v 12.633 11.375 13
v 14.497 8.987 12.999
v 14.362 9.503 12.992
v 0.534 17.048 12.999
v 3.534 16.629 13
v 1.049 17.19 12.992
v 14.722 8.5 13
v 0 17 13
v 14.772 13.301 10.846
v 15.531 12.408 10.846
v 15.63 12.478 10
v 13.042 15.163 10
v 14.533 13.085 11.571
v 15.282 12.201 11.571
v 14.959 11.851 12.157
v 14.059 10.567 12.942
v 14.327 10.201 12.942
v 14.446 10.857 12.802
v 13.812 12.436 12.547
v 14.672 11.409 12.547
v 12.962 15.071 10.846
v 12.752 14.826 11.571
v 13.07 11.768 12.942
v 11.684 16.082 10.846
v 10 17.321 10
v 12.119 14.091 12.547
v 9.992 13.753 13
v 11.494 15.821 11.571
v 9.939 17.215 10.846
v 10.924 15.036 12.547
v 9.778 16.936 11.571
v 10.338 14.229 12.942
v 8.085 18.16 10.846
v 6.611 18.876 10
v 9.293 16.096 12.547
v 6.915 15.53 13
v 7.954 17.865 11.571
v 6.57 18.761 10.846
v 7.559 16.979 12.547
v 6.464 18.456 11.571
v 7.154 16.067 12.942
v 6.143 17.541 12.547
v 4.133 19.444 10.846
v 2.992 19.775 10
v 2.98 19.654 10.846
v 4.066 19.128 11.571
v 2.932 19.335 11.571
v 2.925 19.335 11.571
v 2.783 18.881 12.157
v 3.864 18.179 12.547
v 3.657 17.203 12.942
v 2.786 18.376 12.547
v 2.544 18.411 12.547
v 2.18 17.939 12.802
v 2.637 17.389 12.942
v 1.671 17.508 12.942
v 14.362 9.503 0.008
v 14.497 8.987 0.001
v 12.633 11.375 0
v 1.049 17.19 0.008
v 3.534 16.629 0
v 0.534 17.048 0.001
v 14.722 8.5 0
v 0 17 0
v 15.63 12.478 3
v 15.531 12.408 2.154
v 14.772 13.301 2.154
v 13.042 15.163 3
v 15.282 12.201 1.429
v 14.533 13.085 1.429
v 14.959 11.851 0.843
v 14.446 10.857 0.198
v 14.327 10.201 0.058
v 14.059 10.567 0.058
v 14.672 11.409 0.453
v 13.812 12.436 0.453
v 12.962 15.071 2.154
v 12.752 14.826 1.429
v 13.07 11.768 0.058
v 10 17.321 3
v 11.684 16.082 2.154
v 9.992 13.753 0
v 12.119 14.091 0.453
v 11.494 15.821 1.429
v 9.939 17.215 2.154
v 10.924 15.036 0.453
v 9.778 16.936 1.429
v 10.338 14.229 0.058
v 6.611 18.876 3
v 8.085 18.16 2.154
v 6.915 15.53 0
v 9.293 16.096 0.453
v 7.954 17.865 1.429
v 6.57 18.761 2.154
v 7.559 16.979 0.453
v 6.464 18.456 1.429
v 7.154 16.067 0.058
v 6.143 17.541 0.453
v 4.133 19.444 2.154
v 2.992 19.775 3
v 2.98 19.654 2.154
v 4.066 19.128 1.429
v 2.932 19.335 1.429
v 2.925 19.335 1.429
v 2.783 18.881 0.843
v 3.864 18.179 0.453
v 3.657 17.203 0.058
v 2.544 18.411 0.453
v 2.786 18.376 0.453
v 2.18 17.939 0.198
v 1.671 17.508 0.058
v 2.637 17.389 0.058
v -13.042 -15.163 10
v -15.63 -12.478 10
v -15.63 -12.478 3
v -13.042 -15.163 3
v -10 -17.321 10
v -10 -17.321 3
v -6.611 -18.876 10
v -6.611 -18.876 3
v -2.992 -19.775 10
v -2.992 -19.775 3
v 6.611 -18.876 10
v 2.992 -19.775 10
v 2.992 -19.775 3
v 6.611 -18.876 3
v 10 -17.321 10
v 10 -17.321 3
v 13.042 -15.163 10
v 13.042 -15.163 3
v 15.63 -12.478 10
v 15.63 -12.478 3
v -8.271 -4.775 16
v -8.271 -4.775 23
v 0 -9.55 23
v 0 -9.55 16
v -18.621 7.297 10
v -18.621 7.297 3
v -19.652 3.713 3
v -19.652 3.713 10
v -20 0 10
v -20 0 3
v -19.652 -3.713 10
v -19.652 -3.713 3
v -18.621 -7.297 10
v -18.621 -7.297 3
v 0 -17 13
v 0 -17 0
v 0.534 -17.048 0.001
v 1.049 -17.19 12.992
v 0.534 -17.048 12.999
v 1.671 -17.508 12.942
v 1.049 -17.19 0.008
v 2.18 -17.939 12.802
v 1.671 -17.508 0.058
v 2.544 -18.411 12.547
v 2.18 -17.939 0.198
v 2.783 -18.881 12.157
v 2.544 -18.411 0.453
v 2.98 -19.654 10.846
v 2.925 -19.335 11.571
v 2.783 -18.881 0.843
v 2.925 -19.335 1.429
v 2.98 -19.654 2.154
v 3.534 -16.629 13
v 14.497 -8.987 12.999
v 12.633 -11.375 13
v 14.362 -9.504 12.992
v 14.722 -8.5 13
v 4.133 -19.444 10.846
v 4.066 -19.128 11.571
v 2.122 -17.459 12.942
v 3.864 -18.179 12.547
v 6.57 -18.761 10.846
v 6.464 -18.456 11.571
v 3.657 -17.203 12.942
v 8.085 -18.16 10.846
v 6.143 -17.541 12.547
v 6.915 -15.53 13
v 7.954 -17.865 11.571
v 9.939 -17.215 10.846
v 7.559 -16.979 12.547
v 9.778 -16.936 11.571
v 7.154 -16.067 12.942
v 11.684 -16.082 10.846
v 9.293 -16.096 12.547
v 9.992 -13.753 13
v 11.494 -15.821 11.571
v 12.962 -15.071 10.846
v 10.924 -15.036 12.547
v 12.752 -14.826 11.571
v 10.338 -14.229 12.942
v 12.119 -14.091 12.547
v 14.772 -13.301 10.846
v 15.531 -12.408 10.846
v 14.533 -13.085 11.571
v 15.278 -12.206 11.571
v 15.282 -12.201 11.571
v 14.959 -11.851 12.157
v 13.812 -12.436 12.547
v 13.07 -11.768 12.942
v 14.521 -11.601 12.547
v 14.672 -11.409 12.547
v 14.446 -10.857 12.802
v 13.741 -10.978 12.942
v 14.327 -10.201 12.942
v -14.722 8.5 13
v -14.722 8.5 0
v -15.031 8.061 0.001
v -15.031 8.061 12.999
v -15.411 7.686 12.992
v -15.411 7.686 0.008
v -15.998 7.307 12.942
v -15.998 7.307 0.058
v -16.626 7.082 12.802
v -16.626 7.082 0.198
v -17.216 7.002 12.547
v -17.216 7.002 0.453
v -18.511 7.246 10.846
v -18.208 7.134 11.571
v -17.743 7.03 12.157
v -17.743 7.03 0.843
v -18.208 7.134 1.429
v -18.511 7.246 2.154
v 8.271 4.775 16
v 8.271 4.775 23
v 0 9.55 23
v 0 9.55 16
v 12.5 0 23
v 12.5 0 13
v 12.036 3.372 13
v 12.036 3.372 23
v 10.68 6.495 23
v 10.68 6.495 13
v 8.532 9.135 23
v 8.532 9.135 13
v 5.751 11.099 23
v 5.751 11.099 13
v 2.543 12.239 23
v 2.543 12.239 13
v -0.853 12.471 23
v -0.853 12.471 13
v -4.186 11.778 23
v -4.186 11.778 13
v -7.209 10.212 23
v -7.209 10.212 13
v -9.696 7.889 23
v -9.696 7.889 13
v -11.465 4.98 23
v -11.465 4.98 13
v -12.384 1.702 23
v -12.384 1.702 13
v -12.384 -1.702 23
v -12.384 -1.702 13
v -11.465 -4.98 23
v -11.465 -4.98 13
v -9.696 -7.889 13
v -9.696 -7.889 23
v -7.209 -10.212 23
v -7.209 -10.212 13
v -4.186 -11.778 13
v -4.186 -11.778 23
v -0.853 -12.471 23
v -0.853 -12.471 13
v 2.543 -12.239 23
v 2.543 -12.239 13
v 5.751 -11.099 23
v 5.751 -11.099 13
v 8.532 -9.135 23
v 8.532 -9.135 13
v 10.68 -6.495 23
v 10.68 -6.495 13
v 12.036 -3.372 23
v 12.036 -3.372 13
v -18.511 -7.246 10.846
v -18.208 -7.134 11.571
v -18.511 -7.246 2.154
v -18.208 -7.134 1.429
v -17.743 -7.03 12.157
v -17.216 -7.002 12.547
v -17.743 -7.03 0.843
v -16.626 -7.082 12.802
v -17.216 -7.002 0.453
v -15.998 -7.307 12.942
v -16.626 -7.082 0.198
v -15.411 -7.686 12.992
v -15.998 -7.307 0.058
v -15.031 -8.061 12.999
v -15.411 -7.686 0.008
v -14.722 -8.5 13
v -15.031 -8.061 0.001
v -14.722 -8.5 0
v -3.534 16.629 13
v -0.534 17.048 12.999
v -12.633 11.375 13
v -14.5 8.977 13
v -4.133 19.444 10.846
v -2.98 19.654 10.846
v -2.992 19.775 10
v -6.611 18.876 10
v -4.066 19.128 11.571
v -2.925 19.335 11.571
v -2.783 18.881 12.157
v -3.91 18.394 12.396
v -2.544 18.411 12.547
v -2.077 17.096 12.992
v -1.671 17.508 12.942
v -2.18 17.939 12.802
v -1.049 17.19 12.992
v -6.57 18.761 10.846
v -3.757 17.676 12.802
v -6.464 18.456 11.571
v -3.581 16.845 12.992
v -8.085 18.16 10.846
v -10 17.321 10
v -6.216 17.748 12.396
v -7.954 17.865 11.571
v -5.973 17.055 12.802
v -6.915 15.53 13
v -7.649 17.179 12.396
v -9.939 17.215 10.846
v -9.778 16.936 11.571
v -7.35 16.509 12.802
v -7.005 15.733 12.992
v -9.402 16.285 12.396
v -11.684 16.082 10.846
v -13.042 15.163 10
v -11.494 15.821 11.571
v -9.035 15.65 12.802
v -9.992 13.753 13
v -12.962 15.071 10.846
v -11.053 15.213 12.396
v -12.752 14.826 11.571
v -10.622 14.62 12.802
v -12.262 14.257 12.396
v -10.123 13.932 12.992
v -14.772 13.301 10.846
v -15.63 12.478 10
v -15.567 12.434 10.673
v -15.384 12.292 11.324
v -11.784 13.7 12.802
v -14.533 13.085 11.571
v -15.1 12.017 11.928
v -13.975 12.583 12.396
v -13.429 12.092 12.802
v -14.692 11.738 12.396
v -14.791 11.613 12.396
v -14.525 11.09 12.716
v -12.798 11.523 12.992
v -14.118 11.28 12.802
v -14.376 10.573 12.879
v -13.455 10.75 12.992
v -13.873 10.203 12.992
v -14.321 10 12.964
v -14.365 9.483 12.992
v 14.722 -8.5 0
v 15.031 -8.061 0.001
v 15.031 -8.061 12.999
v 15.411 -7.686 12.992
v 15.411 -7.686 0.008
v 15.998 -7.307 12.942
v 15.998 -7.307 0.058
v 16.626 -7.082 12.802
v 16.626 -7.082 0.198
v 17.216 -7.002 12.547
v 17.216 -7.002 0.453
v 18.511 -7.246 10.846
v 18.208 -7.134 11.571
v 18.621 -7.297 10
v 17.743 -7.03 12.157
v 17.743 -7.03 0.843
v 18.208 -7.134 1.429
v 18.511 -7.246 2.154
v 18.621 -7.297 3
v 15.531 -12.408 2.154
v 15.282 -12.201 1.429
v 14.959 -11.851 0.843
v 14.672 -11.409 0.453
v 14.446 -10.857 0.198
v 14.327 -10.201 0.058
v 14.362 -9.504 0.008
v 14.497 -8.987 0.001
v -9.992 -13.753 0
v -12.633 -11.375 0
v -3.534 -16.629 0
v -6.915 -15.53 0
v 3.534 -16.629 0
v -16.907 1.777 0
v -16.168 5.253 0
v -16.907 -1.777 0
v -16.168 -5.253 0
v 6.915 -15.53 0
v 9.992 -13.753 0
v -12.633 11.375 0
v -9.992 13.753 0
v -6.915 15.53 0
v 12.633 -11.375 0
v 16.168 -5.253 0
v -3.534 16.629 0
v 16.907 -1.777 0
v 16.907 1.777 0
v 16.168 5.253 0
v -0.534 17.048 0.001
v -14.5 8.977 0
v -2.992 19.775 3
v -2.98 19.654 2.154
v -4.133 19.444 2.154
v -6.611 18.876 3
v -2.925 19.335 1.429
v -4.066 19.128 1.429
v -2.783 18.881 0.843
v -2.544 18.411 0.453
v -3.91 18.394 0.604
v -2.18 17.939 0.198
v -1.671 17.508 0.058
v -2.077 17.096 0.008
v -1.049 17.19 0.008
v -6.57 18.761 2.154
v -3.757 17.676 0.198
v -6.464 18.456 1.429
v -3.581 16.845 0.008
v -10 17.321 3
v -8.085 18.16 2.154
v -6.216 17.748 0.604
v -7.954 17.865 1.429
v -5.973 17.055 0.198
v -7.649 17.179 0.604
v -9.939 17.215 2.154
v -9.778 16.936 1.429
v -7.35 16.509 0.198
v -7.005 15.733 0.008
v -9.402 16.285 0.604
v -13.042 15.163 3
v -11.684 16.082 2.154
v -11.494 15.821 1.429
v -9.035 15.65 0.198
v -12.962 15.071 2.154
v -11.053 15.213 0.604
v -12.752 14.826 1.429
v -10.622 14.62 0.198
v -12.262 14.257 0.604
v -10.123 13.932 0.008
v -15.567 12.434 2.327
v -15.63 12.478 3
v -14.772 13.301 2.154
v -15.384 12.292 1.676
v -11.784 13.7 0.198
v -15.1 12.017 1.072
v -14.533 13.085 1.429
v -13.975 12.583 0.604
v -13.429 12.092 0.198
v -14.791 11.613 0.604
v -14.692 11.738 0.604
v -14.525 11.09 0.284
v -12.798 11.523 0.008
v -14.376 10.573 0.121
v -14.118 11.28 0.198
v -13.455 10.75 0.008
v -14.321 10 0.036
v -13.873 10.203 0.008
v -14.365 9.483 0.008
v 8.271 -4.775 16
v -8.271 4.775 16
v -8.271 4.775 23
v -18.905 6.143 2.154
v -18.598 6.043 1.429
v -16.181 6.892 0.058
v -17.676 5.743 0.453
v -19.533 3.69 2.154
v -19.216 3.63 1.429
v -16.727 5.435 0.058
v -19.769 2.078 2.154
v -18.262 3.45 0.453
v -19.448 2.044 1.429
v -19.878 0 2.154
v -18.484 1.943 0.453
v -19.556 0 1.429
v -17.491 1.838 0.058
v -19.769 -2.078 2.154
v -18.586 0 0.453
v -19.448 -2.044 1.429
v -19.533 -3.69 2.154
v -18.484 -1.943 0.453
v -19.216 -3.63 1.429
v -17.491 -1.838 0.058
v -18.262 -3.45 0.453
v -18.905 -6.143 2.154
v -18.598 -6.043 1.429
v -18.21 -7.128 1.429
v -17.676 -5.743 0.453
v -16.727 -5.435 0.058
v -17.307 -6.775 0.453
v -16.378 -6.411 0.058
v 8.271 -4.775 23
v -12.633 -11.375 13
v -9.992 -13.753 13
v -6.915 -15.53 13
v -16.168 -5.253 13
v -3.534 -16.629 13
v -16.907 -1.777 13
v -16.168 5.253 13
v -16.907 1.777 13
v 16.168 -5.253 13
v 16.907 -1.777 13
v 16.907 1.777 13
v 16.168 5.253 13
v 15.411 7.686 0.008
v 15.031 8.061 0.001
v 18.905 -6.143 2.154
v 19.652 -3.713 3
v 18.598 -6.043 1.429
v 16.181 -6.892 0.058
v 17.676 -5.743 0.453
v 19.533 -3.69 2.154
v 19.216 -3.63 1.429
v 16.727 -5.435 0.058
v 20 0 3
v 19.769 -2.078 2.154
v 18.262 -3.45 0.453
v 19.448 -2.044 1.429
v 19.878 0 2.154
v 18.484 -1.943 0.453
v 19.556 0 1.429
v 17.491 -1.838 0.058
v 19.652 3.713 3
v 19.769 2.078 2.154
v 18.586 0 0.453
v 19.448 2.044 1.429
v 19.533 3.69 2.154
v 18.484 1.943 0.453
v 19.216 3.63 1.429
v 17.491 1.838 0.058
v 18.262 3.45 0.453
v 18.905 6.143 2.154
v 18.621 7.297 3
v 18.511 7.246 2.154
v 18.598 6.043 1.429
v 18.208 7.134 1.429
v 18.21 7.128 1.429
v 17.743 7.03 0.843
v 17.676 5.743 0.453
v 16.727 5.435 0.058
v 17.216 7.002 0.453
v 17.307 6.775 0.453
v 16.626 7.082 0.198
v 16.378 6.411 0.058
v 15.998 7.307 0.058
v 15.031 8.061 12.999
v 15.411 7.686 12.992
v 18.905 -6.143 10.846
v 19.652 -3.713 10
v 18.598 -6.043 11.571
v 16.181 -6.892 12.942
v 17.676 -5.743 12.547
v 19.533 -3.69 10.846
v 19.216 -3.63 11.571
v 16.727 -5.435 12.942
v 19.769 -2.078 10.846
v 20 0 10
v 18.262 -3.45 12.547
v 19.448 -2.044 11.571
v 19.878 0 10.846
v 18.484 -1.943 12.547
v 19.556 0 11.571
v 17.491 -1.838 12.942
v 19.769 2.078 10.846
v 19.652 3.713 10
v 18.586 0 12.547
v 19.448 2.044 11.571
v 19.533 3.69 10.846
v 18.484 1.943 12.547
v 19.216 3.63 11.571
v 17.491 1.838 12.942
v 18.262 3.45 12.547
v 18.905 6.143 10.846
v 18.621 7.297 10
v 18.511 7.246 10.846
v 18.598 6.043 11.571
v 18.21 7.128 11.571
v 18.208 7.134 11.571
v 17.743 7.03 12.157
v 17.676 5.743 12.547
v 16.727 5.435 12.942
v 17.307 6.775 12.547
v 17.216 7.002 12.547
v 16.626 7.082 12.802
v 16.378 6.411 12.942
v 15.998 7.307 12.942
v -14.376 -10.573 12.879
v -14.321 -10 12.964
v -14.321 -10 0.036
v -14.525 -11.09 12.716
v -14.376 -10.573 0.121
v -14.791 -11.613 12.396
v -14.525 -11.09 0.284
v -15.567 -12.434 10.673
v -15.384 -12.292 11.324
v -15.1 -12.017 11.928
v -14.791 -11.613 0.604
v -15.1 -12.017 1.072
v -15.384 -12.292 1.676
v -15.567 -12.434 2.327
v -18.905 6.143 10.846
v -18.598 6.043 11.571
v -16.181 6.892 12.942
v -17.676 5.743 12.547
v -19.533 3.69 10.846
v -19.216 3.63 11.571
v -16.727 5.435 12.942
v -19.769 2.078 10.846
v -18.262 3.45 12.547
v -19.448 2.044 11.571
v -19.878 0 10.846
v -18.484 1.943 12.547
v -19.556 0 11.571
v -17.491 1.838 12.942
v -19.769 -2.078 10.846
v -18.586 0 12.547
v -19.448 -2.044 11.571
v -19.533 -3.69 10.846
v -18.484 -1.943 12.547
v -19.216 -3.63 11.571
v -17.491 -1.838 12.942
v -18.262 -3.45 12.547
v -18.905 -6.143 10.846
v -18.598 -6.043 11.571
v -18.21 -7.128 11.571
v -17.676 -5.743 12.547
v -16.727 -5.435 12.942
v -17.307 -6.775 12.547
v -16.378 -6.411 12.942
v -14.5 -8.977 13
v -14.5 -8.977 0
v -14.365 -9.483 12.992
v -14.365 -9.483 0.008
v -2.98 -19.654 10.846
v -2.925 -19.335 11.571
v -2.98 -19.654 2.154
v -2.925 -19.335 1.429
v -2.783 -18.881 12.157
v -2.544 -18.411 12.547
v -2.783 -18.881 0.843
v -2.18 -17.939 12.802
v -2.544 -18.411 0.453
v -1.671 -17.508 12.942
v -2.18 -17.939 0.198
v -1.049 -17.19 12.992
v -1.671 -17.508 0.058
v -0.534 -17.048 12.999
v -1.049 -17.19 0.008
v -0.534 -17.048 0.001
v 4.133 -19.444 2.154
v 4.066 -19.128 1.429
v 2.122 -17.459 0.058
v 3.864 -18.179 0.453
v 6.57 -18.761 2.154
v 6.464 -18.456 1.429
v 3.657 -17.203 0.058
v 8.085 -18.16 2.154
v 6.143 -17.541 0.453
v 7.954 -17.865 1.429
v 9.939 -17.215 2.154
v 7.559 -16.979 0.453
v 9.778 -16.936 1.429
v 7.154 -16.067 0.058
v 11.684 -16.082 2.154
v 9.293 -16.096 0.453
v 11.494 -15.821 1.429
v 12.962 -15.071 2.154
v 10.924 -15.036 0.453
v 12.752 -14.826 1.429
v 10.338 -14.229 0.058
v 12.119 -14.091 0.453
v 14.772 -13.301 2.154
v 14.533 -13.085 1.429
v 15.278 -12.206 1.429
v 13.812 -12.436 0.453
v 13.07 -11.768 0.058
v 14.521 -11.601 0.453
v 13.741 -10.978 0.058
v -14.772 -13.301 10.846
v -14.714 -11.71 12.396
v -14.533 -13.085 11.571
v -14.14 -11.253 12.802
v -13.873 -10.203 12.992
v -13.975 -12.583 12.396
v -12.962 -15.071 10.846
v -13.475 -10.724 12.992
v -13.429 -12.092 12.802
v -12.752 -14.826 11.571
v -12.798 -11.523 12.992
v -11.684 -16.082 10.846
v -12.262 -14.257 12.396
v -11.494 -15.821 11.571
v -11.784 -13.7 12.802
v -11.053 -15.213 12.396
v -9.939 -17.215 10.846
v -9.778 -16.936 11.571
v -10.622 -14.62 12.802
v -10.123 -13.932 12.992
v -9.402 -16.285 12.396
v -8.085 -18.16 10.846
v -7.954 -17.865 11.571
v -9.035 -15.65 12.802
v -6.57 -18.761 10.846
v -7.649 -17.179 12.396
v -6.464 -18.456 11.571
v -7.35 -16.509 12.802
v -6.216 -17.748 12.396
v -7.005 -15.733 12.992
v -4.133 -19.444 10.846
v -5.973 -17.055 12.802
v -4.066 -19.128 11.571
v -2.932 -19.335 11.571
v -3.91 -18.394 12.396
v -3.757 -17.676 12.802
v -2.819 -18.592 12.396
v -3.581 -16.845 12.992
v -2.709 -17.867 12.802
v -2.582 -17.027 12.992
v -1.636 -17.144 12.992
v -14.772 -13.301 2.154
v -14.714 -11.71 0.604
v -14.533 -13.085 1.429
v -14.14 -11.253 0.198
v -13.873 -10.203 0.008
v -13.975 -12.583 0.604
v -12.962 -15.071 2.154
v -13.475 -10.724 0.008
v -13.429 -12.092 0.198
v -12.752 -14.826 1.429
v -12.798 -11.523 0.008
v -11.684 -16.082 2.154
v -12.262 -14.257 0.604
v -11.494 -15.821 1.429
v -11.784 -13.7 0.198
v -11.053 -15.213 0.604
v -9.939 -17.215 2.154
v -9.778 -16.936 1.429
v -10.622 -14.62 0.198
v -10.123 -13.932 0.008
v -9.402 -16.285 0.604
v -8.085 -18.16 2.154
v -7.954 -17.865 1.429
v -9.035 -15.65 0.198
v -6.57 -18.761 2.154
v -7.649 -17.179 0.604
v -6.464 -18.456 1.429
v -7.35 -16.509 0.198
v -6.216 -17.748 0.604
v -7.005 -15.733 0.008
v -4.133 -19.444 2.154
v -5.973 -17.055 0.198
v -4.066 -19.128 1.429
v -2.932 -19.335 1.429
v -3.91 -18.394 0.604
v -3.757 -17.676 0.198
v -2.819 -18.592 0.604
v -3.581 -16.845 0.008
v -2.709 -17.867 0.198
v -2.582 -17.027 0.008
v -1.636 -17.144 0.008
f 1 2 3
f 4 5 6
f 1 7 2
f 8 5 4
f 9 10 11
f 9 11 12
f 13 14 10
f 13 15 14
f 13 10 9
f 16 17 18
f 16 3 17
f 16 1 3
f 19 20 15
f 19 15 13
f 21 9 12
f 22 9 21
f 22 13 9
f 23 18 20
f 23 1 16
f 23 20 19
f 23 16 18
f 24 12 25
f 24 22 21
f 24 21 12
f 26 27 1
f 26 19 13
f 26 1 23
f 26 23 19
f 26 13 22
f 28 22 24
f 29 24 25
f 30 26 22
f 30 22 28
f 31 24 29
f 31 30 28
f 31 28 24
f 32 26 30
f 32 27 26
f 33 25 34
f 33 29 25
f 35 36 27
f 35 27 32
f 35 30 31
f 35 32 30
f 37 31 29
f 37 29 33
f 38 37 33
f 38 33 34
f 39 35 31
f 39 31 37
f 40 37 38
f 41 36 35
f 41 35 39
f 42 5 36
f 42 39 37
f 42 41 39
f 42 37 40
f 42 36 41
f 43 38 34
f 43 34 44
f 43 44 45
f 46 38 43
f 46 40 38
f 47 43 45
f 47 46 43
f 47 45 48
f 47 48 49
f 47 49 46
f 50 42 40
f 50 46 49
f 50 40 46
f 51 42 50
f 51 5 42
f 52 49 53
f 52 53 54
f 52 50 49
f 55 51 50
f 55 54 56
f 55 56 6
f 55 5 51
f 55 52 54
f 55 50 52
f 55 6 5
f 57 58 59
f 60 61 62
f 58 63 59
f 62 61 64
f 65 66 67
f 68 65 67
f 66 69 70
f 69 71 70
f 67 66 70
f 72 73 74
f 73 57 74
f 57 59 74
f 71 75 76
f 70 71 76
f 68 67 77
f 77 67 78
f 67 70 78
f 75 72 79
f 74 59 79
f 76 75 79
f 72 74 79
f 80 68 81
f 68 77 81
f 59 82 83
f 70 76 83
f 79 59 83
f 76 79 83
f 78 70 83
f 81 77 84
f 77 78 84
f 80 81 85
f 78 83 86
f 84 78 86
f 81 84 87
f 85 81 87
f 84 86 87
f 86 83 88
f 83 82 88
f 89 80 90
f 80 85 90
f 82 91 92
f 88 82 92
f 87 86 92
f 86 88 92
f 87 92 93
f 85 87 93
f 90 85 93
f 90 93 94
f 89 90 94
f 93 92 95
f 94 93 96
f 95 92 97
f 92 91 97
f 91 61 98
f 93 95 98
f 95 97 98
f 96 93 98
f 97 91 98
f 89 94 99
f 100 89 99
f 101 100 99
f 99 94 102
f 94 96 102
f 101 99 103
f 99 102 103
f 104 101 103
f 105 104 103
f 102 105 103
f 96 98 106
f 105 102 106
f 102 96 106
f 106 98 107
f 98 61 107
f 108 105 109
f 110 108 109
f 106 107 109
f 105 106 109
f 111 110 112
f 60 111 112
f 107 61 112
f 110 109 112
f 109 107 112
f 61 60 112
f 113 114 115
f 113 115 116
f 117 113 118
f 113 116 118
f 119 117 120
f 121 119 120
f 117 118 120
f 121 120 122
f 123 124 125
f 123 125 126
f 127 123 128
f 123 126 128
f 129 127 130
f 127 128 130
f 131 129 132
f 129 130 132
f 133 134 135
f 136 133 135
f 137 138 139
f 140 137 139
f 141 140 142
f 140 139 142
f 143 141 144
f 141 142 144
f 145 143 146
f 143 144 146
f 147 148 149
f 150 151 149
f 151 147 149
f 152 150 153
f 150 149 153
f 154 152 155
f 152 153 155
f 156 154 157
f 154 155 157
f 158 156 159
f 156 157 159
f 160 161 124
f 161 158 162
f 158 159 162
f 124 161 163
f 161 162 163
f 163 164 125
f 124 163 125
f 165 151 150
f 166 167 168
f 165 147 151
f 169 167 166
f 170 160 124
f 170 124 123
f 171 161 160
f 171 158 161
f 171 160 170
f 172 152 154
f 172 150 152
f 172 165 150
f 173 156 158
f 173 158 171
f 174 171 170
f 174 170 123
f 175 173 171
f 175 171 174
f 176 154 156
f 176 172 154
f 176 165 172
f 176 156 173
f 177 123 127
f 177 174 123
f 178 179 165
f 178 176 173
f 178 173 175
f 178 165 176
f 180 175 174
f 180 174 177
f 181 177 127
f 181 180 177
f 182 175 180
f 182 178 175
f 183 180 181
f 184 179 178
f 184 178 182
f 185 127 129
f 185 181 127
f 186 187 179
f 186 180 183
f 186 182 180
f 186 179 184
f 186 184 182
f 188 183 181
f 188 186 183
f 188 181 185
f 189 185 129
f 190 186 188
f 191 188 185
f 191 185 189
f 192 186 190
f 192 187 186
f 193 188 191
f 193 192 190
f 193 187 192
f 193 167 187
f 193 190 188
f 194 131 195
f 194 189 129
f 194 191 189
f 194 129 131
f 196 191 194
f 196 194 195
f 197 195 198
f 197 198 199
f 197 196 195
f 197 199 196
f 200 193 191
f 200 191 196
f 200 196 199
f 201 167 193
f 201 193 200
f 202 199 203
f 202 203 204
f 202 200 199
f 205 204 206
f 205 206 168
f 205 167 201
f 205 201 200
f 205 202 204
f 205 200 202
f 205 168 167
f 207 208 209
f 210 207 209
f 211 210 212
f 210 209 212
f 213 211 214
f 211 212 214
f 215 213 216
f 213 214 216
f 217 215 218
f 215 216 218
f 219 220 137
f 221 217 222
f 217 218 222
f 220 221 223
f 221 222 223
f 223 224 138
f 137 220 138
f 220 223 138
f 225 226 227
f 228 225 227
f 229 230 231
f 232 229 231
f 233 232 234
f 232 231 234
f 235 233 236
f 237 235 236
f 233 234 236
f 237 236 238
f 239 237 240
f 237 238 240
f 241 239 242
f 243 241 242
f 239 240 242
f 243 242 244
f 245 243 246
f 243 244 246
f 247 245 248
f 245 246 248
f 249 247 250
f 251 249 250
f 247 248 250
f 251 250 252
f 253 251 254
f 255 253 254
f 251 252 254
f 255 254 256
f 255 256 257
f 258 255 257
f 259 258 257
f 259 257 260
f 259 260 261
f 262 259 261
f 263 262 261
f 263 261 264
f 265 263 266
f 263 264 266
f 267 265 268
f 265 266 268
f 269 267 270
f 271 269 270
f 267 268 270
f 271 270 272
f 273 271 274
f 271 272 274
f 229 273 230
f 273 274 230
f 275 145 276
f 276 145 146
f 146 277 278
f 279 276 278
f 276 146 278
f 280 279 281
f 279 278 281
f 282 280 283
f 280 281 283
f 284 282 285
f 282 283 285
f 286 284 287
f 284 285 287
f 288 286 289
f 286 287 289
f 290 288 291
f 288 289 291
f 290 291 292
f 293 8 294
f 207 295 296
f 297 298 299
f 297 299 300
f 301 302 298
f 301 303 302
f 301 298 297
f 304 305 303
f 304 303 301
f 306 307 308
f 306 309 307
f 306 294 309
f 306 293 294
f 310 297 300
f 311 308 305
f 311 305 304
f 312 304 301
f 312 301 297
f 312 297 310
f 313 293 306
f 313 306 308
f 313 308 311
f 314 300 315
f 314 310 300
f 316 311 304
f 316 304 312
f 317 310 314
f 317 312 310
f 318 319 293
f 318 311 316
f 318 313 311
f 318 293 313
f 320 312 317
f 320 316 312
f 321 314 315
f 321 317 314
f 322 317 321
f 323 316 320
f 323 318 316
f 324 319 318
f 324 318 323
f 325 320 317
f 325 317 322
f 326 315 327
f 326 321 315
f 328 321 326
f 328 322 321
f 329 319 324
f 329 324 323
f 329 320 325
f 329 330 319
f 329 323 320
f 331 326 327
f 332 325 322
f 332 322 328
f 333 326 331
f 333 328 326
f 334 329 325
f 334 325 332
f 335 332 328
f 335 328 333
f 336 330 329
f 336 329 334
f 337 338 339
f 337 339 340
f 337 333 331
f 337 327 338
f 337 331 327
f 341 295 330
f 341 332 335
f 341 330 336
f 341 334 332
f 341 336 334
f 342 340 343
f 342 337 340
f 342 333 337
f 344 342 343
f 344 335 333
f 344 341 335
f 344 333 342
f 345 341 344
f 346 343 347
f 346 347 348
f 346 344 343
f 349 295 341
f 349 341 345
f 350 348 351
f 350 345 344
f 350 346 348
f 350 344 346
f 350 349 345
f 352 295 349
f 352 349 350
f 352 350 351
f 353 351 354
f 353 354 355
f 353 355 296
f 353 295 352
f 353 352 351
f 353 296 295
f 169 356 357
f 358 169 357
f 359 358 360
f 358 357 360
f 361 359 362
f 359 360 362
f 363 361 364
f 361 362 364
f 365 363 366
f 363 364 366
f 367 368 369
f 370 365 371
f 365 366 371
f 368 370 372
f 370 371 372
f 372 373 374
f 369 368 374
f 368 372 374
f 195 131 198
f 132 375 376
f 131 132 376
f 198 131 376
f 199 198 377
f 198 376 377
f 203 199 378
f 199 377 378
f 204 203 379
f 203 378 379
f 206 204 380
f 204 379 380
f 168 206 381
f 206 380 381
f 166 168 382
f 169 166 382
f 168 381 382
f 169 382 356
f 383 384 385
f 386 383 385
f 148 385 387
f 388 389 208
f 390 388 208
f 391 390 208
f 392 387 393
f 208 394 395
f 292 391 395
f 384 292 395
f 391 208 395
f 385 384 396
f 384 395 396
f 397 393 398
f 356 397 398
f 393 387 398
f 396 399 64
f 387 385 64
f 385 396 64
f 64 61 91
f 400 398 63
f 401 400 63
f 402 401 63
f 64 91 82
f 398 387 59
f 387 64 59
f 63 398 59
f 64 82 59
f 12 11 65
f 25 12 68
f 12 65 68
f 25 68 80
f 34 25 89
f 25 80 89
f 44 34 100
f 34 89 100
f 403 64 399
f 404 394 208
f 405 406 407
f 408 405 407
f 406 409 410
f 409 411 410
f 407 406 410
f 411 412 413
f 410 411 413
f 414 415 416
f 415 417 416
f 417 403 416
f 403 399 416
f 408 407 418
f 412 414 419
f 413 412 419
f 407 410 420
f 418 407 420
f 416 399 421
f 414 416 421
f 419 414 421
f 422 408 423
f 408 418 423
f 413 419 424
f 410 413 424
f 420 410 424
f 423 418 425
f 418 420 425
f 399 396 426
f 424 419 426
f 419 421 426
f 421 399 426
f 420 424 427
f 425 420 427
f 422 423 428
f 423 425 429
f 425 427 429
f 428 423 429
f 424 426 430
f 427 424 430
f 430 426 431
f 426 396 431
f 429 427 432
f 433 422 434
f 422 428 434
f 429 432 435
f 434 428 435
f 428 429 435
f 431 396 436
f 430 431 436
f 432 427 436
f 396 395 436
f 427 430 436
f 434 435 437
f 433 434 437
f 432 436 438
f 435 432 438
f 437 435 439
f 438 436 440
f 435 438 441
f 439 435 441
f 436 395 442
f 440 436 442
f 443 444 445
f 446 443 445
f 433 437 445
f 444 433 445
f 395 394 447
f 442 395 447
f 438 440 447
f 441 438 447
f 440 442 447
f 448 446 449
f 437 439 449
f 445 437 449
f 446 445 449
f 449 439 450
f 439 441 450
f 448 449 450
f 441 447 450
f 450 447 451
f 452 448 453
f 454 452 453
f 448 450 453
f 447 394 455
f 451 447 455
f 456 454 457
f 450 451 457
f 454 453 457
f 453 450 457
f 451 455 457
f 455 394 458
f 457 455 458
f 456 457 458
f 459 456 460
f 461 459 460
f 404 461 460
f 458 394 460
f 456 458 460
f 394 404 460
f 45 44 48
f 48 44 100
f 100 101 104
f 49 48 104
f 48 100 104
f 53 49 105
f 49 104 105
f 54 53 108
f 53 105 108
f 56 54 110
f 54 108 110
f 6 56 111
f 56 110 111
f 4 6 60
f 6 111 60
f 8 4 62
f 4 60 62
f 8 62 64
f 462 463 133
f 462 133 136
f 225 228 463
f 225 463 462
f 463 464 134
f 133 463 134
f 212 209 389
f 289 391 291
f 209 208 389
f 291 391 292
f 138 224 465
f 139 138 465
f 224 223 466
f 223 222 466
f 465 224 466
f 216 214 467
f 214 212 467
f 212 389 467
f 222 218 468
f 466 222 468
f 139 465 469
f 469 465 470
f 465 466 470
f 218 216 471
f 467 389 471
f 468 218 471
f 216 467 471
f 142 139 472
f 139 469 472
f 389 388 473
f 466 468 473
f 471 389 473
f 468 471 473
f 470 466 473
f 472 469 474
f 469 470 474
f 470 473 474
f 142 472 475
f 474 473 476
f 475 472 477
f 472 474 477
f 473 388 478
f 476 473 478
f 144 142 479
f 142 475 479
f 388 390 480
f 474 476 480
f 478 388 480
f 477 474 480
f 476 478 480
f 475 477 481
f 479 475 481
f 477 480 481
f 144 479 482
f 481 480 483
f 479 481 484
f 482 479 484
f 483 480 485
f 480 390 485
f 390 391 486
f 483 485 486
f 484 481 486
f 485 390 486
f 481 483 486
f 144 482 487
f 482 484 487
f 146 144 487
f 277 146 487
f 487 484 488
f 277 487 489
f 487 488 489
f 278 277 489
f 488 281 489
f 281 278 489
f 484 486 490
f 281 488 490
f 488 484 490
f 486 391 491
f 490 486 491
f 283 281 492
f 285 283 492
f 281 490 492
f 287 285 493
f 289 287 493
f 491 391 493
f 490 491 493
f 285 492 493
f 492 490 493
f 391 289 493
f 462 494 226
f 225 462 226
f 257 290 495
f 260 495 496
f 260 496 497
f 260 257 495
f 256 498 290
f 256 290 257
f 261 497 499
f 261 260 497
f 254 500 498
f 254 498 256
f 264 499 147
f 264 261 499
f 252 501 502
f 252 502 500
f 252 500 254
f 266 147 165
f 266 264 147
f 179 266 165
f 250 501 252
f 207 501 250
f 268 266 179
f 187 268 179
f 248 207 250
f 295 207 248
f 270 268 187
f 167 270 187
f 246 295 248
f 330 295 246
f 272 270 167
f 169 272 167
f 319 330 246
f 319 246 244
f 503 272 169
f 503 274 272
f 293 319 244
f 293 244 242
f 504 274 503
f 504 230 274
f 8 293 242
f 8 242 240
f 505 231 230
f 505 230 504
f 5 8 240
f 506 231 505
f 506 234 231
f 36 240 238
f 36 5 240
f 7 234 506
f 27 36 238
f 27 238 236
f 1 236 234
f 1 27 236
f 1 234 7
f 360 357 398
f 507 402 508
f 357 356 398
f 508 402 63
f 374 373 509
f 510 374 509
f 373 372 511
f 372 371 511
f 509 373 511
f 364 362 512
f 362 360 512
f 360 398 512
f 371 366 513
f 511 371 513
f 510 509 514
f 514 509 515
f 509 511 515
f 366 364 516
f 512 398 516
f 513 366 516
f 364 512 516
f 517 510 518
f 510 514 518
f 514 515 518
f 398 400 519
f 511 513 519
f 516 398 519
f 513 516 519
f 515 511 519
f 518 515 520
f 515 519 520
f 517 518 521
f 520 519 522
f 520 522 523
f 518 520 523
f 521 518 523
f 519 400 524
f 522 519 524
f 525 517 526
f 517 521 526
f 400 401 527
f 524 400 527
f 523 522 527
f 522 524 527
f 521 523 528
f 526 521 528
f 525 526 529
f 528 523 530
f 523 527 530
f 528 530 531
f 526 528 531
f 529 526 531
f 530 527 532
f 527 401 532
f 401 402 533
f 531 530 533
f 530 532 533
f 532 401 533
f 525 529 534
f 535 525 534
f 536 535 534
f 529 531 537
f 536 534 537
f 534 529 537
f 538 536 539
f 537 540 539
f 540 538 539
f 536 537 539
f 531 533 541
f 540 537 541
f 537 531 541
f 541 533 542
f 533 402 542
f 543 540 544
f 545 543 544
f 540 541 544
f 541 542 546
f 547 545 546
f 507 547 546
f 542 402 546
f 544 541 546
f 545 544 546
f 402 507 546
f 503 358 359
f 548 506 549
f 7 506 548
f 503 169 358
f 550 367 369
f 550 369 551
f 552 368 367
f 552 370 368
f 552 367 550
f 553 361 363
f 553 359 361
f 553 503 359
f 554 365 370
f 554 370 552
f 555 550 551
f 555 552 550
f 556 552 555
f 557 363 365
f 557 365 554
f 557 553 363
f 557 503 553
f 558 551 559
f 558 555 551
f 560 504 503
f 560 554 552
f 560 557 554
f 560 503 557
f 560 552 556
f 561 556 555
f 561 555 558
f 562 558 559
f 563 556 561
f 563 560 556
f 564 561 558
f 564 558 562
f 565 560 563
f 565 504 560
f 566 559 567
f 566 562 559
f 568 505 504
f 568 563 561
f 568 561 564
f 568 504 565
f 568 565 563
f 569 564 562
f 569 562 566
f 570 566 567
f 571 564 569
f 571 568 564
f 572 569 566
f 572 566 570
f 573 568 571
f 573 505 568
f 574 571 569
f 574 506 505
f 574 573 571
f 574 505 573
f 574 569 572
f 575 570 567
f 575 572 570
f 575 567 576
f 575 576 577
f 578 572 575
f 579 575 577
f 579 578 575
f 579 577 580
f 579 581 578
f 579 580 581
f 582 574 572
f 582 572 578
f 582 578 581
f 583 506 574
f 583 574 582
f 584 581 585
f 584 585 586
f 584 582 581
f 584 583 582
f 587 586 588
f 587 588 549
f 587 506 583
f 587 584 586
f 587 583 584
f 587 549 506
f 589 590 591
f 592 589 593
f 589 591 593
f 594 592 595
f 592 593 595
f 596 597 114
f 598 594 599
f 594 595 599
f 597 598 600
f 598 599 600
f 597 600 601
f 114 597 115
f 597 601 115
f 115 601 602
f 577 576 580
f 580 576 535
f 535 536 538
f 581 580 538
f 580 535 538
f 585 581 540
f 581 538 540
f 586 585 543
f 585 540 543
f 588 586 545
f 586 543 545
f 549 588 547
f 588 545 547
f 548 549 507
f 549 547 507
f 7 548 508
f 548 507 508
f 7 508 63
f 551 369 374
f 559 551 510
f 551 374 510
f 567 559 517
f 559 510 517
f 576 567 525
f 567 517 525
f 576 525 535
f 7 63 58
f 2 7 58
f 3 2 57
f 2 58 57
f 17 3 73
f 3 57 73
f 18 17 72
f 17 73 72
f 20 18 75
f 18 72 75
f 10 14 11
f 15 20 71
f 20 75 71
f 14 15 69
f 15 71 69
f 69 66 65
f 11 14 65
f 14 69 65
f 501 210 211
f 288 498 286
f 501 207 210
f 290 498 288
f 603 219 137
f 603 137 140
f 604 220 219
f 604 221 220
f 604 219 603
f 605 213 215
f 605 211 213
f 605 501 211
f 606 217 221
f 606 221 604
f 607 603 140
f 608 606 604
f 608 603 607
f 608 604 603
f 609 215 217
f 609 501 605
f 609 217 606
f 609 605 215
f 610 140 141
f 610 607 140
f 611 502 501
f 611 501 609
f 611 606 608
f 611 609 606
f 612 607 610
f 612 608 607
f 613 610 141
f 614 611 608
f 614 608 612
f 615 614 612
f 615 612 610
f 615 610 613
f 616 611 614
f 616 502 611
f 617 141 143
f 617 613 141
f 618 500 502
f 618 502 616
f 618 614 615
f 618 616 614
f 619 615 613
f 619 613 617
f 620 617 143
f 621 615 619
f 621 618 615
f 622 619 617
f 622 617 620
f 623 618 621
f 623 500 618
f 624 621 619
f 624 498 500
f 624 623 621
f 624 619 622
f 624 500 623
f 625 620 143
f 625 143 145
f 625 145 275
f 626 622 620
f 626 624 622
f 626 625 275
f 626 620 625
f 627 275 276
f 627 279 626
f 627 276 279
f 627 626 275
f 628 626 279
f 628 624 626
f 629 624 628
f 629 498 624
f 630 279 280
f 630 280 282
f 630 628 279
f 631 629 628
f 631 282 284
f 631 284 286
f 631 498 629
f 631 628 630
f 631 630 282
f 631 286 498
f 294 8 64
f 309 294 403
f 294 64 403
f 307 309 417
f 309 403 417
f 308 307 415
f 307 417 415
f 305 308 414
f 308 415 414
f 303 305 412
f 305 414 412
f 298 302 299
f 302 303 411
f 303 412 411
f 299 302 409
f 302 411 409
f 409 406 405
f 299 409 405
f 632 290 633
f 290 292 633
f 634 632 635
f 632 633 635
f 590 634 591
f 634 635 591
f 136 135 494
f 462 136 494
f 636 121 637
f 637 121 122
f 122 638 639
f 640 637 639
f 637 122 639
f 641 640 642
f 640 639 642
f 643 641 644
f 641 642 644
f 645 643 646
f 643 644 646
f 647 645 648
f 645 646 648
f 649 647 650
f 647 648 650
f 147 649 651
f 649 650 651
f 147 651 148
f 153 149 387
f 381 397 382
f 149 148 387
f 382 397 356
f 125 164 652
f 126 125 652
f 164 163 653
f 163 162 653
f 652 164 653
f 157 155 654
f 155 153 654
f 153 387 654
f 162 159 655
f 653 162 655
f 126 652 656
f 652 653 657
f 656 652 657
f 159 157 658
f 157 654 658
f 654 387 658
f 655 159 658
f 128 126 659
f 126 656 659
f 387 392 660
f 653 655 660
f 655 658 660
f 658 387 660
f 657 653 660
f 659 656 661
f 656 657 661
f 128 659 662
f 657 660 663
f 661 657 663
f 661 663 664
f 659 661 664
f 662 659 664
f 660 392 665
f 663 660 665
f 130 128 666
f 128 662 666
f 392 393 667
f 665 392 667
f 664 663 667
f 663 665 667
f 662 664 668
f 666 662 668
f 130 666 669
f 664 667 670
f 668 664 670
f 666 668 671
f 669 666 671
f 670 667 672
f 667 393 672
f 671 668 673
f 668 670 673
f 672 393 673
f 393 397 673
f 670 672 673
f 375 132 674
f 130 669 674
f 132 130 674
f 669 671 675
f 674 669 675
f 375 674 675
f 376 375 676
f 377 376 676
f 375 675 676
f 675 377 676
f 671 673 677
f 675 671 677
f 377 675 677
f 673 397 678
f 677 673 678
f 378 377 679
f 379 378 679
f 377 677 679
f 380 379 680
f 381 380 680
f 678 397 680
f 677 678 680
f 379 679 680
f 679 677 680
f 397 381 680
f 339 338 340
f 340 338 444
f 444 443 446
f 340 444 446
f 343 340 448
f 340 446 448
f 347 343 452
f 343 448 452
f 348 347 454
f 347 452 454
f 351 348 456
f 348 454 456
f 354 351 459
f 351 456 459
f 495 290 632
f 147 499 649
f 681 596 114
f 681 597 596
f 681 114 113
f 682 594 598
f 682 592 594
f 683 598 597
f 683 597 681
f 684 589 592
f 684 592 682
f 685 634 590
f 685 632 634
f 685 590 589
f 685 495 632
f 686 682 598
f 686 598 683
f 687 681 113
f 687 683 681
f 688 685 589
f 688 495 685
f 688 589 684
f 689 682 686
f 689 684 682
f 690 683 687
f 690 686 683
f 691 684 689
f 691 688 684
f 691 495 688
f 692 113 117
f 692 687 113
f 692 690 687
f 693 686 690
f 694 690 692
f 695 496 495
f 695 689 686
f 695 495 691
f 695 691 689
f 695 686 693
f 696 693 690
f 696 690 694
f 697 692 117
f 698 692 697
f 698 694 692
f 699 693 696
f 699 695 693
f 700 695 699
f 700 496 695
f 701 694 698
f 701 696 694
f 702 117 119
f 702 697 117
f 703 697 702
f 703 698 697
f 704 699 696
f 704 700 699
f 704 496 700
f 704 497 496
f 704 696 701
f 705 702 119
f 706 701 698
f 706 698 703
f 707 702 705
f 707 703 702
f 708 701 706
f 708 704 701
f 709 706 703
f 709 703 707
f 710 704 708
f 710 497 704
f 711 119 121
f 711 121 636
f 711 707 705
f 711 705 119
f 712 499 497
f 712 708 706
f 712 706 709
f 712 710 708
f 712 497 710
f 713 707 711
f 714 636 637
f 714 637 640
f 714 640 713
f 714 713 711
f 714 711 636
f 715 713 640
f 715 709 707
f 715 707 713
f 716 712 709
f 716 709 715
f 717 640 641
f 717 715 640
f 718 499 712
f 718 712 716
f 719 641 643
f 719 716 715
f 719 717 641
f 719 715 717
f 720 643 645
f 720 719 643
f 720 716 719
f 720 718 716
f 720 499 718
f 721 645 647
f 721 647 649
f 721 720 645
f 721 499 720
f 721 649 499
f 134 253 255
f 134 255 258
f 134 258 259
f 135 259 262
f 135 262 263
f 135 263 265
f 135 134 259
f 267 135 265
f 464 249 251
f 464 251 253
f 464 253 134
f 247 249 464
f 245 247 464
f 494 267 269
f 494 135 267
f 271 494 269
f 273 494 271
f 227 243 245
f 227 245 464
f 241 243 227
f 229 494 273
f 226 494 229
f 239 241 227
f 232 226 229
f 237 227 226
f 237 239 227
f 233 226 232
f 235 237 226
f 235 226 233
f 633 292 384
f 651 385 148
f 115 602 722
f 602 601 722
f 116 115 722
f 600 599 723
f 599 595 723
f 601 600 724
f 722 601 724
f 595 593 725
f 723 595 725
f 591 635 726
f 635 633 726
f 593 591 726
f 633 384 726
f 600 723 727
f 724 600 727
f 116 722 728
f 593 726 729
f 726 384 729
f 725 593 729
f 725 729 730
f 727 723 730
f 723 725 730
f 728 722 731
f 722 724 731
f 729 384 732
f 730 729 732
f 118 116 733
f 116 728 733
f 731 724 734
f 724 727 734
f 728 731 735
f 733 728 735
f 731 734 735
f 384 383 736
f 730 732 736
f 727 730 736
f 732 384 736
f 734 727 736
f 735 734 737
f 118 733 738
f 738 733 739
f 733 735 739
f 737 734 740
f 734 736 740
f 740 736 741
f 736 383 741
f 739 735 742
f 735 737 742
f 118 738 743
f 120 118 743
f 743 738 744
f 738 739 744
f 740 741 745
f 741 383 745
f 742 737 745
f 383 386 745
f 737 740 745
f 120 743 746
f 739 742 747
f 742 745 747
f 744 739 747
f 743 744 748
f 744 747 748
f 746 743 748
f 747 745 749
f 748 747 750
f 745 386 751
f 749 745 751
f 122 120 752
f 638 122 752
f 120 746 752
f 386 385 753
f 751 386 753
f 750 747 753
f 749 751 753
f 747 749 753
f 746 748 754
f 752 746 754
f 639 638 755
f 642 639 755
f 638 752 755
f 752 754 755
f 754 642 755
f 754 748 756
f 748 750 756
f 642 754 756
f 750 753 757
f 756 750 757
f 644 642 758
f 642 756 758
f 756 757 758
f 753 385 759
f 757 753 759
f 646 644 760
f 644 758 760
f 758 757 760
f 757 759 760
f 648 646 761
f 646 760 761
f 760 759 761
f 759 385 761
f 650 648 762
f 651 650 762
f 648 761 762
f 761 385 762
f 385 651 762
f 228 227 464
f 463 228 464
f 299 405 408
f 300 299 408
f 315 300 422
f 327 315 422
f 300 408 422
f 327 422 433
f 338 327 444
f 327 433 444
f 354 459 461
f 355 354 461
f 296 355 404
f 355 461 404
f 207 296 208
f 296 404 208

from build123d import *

# Parameters (mm, degrees)
F0_R     = 20
F1_DEPTH = 13
F2_R     = 12.5
F3_DEPTH = 10
F4_R     = 3
F6_DEPTH = 7
F8_DEPTH = 25


with BuildPart() as f1:
    # F0 (on Top) → F1 (new body)
    with BuildSketch(Plane.XY):
        Circle(F0_R)
    extrude(amount=F1_DEPTH)

    # F2 (on face) → F3 (join)
    with BuildSketch(Plane.XY.offset(13)):
        Circle(F2_R)
    extrude(amount=F3_DEPTH)

    # F4
    f4_edges = [f1.edges().sort_by_distance(p)[0] for p in [
        (-20, 0, 13),
        (-20, 0, 0),
    ]]
    fillet(f4_edges, radius=F4_R)

    # F5 (on face) → F6 (cut)
    with BuildSketch(Plane.XY.offset(23)):
        Polygon((8.2705426061, 4.775), (0, 9.55), (-8.2705426061, 4.775), (-8.2705426061, -4.775), (0, -9.55), (8.2705426061, -4.775), align=None)
    extrude(amount=-F6_DEPTH, mode=Mode.SUBTRACT)

    # F7 (on face) → F8 (cut)
    with BuildSketch(Plane(origin=(0, 0, 0), x_dir=(1, 0, 0), z_dir=(0, 0, -1))):
        with BuildLine():
            ThreePointArc((14.7224318372, 8.5000000471), (16.435854573, 7.1334012872), (18.6214276605, 7.2967411826))
            ThreePointArc((18.6214276605, 7.2967411826), (17.3205080757, 10), (15.6298770592, 12.4782588174))
            ThreePointArc((15.6298770592, 12.4782588174), (14.3956340287, 10.6671670025), (14.7224318372, 8.5000000471))
        make_face()
        with BuildLine():
            ThreePointArc((20.3205080757, -10), (19.8604646456, -8.4035600159), (18.6214276605, -7.2967411826))
            ThreePointArc((18.6214276605, -7.2967411826), (17.3205080757, -10), (15.6298770592, -12.4782588174))
            ThreePointArc((15.6298770592, -12.4782588174), (18.7219549977, -12.6525358668), (20.3205080757, -10))
        make_face()
        with BuildLine():
            ThreePointArc((15.6298770592, -12.4782588174), (17.3205080757, -10), (18.6214276605, -7.2967411826))
            ThreePointArc((18.6214276605, -7.2967411826), (16.435854533, -7.1334012995), (14.7224317953, -8.5000001196))
            ThreePointArc((14.7224317953, -8.5000001196), (14.395634038, -10.6671670433), (15.6298770592, -12.4782588174))
        make_face()
        with BuildLine():
            ThreePointArc((-1.46e-08, 17), (2.040220571, 17.8005682502), (2.9915506013, 19.775))
            ThreePointArc((2.9915506013, 19.775), (0, 20), (-2.9915506013, 19.775))
            ThreePointArc((-2.9915506013, 19.775), (-2.0402205817, 17.8005682602), (-1.46e-08, 17))
        make_face()
        with BuildLine():
            ThreePointArc((-2.9915506013, 19.775), (0, 20), (2.9915506013, 19.775))
            ThreePointArc((2.9915506013, 19.775), (2.9978869061, 19.8874207031), (3, 20))
            ThreePointArc((3, 20), (-0.1125792969, 22.9978869061), (-2.9915506013, 19.775))
        make_face()
        with BuildLine():
            ThreePointArc((3, -20), (2.9978869061, -19.8874207031), (2.9915506013, -19.775))
            ThreePointArc((2.9915506013, -19.775), (0, -20), (-2.9915506013, -19.775))
            ThreePointArc((-2.9915506013, -19.775), (-0.1125792969, -22.9978869061), (3, -20))
        make_face()
        with BuildLine():
            ThreePointArc((-2.9915506013, -19.775), (0, -20), (2.9915506013, -19.775))
            ThreePointArc((2.9915506013, -19.775), (2.0402205635, -17.8005682433), (-3.5e-08, -17))
            ThreePointArc((-3.5e-08, -17), (-2.0402205891, -17.8005682671), (-2.9915506013, -19.775))
        make_face()
        with BuildLine():
            ThreePointArc((-18.6214276605, 7.2967411826), (-16.4358546167, 7.1334012737), (-14.7224318829, 8.4999999678))
            ThreePointArc((-14.7224318829, 8.4999999678), (-14.4227306016, 9.2235428467), (-14.3205080757, 10))
            ThreePointArc((-14.3205080757, 10), (-14.6679722089, 11.401446922), (-15.6298770592, 12.4782588174))
            ThreePointArc((-15.6298770592, 12.4782588174), (-17.3205080757, 10), (-18.6214276605, 7.2967411826))
        make_face()
        with BuildLine():
            ThreePointArc((-14.3205080757, -10), (-14.4227305909, -9.2235428867), (-14.7224318416, -8.5000000394))
            ThreePointArc((-14.7224318416, -8.5000000394), (-16.4358545772, -7.1334012859), (-18.6214276605, -7.2967411826))
            ThreePointArc((-18.6214276605, -7.2967411826), (-17.3205080757, -10), (-15.6298770592, -12.4782588174))
            ThreePointArc((-15.6298770592, -12.4782588174), (-14.6679722089, -11.401446922), (-14.3205080757, -10))
        make_face()
        with BuildLine():
            ThreePointArc((-18.6214276605, 7.2967411826), (-17.3205080757, 10), (-15.6298770592, 12.4782588174))
            ThreePointArc((-15.6298770592, 12.4782588174), (-19.918584287, 11.5), (-18.6214276605, 7.2967411826))
        make_face()
        with BuildLine():
            ThreePointArc((-18.6214276605, -7.2967411826), (-19.918584287, -11.5), (-15.6298770592, -12.4782588174))
            ThreePointArc((-15.6298770592, -12.4782588174), (-17.3205080757, -10), (-18.6214276605, -7.2967411826))
        make_face()
    extrude(amount=-F8_DEPTH, mode=Mode.SUBTRACT)


solid = f1.part
